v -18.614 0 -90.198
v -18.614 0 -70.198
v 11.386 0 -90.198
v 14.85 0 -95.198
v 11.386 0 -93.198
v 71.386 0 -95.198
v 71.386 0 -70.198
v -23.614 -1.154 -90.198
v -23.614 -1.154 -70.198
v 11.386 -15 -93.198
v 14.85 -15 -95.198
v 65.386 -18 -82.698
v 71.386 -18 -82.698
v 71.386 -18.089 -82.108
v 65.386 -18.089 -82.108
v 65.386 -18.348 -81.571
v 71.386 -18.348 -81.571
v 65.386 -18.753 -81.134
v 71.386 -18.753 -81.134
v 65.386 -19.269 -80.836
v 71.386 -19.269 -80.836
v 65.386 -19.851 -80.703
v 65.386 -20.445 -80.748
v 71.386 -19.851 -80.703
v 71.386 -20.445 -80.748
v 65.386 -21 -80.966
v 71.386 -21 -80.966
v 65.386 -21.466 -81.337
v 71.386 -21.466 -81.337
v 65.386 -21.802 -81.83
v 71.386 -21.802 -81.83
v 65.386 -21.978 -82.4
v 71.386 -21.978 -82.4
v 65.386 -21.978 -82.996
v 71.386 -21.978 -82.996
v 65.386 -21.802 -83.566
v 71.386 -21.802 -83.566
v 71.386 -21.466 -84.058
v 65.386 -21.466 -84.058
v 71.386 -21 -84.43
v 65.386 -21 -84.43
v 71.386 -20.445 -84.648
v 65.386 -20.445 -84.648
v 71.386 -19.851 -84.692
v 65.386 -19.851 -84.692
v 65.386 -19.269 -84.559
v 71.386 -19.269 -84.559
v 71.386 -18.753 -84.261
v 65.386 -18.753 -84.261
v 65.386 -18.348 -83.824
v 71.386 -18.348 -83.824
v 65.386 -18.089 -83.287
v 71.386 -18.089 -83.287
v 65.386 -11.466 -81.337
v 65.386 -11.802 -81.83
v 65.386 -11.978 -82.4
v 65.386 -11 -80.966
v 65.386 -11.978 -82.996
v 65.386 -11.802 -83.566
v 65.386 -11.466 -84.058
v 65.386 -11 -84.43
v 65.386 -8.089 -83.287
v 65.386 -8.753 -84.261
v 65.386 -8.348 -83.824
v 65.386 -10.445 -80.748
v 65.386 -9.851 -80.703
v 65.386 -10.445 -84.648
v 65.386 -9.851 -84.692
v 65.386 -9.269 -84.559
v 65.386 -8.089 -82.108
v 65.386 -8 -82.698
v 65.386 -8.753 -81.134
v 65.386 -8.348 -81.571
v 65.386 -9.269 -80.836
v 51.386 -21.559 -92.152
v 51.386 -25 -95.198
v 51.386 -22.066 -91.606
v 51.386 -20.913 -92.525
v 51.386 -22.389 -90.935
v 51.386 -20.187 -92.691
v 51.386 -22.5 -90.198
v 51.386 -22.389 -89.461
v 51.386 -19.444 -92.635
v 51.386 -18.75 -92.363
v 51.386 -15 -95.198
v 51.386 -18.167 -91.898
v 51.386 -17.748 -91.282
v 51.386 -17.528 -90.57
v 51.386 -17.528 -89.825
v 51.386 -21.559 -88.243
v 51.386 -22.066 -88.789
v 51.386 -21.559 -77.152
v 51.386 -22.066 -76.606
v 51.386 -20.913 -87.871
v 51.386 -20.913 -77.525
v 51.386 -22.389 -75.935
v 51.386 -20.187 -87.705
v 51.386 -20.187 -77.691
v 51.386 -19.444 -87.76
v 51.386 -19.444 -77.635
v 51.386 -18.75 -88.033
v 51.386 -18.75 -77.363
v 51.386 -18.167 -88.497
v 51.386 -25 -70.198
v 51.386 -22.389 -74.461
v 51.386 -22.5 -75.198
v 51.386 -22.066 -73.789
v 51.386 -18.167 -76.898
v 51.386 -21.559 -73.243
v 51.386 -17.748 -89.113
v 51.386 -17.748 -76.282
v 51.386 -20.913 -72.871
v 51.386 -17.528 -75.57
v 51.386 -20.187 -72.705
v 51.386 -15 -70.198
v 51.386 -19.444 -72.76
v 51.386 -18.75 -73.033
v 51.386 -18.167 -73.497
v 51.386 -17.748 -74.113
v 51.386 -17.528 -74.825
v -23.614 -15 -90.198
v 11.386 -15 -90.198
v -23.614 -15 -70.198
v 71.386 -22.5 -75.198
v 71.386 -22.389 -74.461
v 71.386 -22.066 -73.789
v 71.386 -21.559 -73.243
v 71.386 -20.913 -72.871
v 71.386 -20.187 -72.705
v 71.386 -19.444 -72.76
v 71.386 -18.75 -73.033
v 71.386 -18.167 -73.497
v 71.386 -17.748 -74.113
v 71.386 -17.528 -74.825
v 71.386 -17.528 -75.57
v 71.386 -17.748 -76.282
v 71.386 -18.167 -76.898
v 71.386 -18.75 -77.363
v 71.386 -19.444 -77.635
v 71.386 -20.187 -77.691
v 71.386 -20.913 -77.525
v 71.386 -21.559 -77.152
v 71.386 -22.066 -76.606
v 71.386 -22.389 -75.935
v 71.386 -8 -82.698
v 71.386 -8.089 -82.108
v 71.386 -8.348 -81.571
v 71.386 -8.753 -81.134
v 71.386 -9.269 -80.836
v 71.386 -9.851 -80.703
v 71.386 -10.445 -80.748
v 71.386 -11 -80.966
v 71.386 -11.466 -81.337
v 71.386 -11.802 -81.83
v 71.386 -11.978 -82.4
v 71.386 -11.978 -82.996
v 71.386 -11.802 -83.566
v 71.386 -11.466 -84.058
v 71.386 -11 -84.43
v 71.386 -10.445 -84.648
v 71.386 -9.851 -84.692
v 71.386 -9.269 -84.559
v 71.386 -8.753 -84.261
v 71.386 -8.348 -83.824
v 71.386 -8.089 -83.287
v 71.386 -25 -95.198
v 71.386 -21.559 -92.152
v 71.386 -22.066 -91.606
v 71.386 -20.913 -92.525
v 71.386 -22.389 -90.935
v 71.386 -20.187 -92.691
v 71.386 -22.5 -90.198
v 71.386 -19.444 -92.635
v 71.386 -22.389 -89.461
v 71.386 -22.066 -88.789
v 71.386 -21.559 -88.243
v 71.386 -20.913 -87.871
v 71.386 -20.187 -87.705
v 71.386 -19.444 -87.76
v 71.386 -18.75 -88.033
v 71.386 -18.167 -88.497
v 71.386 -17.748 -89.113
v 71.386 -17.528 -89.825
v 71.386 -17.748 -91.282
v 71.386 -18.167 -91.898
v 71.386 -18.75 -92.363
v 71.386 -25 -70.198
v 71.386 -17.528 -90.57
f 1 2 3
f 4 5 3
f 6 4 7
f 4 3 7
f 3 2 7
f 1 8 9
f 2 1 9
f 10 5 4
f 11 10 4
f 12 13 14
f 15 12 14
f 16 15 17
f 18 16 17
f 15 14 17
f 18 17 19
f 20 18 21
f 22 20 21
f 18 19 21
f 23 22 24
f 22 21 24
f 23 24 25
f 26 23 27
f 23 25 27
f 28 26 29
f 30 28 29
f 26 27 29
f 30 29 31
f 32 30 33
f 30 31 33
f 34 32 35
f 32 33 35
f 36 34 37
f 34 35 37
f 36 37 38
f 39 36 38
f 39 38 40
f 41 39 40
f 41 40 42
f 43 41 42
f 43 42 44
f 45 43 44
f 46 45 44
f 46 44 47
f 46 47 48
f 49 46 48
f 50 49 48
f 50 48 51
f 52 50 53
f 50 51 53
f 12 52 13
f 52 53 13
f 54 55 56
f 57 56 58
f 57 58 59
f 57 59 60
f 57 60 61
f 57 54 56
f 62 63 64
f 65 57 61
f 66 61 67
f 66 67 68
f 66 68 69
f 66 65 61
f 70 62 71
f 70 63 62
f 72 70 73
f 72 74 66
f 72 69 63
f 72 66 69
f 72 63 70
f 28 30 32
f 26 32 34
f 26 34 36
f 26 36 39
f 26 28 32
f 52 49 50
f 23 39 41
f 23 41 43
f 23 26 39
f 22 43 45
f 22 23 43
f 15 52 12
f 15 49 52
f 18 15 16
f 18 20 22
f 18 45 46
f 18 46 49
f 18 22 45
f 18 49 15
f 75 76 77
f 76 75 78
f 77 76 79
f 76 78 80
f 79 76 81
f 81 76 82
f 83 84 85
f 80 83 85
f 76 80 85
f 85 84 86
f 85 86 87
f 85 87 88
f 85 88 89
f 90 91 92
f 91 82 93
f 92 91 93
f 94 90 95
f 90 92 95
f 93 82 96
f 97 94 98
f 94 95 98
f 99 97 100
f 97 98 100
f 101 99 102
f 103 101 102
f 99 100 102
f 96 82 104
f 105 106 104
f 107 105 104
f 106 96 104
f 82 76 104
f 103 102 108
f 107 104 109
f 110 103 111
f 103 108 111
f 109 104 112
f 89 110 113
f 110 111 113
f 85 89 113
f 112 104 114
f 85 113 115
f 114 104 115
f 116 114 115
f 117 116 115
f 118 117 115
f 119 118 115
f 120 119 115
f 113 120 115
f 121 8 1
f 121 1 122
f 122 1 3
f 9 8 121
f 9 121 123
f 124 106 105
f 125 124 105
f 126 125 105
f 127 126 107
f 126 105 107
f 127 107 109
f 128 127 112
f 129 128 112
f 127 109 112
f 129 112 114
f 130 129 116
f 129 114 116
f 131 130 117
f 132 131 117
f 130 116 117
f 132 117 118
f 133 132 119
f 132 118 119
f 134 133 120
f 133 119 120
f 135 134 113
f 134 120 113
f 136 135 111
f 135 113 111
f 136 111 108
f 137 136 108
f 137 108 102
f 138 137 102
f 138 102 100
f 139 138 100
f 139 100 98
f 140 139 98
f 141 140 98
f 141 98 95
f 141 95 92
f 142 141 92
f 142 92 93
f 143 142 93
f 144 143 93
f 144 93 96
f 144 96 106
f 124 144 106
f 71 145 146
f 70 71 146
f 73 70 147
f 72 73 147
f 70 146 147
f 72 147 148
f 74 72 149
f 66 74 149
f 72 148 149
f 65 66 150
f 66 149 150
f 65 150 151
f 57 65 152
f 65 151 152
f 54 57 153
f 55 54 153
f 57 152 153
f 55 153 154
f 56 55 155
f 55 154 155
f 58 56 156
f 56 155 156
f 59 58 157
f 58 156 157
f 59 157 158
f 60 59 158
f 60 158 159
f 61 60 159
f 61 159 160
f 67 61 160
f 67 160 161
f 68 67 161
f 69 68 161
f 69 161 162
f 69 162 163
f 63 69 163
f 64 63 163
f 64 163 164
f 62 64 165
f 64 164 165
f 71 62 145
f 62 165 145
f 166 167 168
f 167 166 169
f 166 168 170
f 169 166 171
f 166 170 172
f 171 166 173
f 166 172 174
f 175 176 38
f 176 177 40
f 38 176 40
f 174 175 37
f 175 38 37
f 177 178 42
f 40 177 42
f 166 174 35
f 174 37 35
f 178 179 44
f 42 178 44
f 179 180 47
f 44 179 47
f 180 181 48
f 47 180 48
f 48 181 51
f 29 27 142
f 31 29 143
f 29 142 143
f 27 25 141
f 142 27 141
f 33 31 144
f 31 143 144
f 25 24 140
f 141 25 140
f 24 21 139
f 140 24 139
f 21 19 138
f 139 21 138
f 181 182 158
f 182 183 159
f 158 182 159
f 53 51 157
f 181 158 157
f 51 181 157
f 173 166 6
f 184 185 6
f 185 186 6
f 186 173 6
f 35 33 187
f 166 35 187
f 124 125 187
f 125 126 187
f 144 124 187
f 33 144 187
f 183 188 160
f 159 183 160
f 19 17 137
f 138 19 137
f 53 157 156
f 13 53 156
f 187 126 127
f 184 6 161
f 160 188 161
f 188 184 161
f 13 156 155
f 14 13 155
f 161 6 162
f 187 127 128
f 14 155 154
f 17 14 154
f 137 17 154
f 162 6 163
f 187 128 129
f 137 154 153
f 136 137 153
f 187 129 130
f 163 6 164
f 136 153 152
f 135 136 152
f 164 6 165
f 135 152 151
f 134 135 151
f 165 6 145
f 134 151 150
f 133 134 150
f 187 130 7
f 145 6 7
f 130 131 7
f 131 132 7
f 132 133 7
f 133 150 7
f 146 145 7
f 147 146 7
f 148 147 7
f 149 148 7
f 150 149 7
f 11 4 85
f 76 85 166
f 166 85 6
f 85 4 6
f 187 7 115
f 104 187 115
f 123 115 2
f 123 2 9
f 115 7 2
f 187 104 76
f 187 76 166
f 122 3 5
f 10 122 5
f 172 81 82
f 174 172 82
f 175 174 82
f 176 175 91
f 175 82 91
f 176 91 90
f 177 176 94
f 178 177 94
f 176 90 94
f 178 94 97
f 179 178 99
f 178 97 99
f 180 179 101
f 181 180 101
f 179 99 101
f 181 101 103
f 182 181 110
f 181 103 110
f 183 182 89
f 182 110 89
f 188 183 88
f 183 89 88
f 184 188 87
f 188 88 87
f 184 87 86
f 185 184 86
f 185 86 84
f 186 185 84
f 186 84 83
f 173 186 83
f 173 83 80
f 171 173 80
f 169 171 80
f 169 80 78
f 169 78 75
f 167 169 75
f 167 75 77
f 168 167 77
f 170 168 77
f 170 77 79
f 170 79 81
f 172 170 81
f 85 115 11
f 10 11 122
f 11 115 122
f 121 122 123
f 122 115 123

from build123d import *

# Parameters (mm, degrees)
F0_W     = 6
F0_H     = 2
F0_W_2   = 3.464102
F0_H_2   = 20
F0_W_3   = 20
F0_H_3   = 5
F1_DEPTH = 25
F3_DEPTH = 25.001
F4_R     = 2.5
F5_DEPTH = 20.001
F6_R     = 2
F7_DEPTH = 6
F8_SIZE2 = 1.154341
F8_SIZE  = 5


with BuildPart() as f1:
    # F0 (on Front) → F1 (new body)
    with BuildSketch(Plane.XZ):
        with Locations((68.386151, -81.697741)):
            Rectangle(F0_W, F0_H)
        with Locations((68.386151, -83.697741)):
            Rectangle(F0_W, F0_H)
        Polygon((51.386151, -75.197741), (51.386151, -70.197741), (-20.149747, -70.197741), (-20.149747, -90.197741), (11.386151, -90.197741), (11.386151, -93.197741), (14.850253, -95.197741), (51.386151, -95.197741), (51.386151, -90.197741), align=None)
        with Locations((-21.881798, -80.197741)):
            Rectangle(F0_W_2, F0_H_2)
        with Locations((61.386151, -72.697741)):
            Rectangle(F0_W_3, F0_H_3)
        with Locations((61.386151, -92.697741)):
            Rectangle(F0_W_3, F0_H_3)
        Polygon((71.386151, -80.697741), (71.386151, -75.197741), (51.386151, -75.197741), (51.386151, -90.197741), (71.386151, -90.197741), (71.386151, -84.697741), (65.386151, -84.697741), (64.231451, -82.697741), (65.386151, -80.697741), align=None)
        Polygon((65.386151, -82.697741), (65.386151, -80.697741), (64.231451, -82.697741), align=None)
        Polygon((65.386151, -84.697741), (65.386151, -82.697741), (64.231451, -82.697741), align=None)
    extrude(amount=F1_DEPTH)

    # F2 (on face) → F3 (cut, through all)
    with BuildSketch(Plane.XY.offset(-70.197741)):
        Polygon((-23.613849, -25), (51.386151, -25), (51.386151, -20), (51.386151, -15), (11.386151, -15), (-23.613849, -15), align=None)
    extrude(amount=-F3_DEPTH, mode=Mode.SUBTRACT)

    # F4 (on face) → F5 (cut, through all)
    with BuildSketch(Plane(origin=(51.386151, 0, 0), x_dir=(0, -1, 0), z_dir=(-1, 0, 0))):
        with Locations((20, -75.197741)):
            Circle(F4_R)
        with Locations((20, -90.197741)):
            Circle(F4_R)
    extrude(amount=-F5_DEPTH, mode=Mode.SUBTRACT)

    # F6 (on face) → F7 (cut)
    with BuildSketch(Plane.YZ.offset(71.386151)):
        with Locations((-20, -82.697741)):
            Circle(F6_R)
        with Locations((-10, -82.697741)):
            Circle(F6_R)
    extrude(amount=-F7_DEPTH, mode=Mode.SUBTRACT)

    # F8
    f8_edges = [f1.edges().sort_by_distance(p)[0] for p in [
        (-23.613849, 0, -80.197741),
    ]]
    chamfer(f8_edges, length=F8_SIZE, length2=F8_SIZE2)


solid = f1.part
